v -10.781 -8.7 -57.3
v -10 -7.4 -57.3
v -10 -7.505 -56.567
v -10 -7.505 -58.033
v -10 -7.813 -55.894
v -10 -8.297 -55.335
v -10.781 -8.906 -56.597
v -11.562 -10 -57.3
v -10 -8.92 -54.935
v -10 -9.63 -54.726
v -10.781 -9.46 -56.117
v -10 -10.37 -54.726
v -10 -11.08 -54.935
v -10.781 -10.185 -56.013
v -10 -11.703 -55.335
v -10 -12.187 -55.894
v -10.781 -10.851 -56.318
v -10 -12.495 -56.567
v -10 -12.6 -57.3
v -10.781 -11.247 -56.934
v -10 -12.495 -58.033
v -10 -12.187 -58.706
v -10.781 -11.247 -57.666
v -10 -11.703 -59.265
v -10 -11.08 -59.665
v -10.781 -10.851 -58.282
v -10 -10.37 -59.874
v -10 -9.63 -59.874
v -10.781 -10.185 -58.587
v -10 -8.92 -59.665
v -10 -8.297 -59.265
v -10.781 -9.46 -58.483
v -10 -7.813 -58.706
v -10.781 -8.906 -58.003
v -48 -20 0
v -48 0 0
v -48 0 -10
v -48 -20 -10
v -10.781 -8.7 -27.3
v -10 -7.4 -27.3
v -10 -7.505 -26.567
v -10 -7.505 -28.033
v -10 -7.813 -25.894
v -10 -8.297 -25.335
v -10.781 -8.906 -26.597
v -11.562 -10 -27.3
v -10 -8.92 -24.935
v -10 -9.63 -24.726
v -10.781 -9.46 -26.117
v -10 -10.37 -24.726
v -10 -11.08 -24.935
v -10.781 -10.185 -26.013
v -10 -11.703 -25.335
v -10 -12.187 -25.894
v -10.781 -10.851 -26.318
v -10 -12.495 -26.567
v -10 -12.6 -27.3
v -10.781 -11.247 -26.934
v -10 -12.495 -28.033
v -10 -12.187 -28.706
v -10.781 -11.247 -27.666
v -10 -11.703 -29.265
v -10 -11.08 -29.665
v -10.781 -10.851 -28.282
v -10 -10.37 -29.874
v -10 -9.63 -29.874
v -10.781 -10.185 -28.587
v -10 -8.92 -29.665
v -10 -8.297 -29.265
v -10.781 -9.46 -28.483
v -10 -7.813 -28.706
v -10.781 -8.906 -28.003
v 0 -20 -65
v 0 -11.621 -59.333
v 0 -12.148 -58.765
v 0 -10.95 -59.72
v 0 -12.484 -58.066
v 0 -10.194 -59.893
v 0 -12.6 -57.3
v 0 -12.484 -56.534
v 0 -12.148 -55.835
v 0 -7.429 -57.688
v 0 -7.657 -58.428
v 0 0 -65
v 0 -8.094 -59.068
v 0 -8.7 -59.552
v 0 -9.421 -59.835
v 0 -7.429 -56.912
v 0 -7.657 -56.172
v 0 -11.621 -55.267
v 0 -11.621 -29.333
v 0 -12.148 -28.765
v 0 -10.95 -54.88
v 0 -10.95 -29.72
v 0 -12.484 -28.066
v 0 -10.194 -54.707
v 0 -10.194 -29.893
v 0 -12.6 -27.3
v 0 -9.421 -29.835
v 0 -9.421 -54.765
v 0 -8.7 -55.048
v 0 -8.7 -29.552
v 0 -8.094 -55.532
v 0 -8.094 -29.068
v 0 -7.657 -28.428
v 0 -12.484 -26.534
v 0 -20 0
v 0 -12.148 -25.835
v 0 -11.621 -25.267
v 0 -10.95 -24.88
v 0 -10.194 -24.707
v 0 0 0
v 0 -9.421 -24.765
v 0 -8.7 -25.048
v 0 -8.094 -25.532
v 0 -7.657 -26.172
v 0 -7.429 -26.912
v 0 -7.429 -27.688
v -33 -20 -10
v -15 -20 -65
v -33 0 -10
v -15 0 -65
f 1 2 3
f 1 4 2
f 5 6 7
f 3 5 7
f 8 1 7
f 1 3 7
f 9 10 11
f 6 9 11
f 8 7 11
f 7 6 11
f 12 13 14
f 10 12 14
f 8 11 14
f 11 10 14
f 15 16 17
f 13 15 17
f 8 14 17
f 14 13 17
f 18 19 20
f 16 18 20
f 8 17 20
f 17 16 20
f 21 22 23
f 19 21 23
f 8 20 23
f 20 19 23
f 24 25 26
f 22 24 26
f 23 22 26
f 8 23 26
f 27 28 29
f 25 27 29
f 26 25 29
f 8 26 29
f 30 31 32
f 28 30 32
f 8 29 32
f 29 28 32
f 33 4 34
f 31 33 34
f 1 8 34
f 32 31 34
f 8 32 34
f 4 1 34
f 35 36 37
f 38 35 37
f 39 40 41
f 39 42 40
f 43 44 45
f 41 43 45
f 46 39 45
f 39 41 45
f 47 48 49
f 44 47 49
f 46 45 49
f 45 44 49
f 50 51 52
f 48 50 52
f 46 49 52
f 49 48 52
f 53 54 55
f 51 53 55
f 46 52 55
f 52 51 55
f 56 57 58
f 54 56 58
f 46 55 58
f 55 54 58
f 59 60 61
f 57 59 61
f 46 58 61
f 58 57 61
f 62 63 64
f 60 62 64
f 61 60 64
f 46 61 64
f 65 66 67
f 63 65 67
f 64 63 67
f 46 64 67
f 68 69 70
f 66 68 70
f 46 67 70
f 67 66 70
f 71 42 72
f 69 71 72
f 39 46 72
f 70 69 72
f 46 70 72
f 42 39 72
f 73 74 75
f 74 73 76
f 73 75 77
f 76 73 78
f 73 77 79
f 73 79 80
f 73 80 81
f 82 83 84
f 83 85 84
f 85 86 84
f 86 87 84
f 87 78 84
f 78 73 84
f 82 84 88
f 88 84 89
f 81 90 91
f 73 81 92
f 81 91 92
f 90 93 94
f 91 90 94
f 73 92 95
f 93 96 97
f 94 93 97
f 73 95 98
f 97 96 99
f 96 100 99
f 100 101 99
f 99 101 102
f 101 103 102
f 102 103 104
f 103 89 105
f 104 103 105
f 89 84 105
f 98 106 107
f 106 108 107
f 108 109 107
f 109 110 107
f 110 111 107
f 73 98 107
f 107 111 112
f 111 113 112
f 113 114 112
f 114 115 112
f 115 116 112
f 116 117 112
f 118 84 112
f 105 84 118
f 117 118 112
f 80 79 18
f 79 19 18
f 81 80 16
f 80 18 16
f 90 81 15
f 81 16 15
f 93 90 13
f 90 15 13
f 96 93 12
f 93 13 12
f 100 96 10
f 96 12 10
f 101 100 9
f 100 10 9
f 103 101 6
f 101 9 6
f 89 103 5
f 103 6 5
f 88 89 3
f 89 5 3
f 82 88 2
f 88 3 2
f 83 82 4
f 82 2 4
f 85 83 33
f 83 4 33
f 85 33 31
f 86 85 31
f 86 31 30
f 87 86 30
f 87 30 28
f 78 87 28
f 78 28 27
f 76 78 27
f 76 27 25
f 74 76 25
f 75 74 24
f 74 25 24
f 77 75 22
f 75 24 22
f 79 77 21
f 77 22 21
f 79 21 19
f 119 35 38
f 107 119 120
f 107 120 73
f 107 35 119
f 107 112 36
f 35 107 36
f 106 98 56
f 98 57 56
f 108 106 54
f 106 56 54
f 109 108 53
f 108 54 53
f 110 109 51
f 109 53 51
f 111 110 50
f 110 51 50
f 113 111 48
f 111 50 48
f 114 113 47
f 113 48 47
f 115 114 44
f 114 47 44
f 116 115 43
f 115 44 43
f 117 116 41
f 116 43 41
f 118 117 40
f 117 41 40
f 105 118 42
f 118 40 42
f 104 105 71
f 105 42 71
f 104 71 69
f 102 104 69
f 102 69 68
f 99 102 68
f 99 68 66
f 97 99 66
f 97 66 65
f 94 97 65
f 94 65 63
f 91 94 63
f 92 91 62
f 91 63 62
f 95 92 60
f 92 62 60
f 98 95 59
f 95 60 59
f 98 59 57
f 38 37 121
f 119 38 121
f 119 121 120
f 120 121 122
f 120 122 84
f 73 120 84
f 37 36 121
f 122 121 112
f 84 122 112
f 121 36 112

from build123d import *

# Parameters (mm, degrees)
F1_DEPTH = 20
F3_D     = 5.2
F3_DEPTH = 10
F3_TIP   = 1.5622376095


with BuildPart() as f1:
    # F0 (on Front) → F1 (new body)
    with BuildSketch(Plane.XZ):
        Polygon((0, -65), (0, 0), (-48, 0), (-48, -10), (-33, -10), (-15, -65), align=None)
    extrude(amount=F1_DEPTH)

    # F3
    with Locations(Plane.YZ):
        with Locations((-10, -27.3), (-10, -57.3)):
            Hole(F3_D / 2, depth=F3_DEPTH)
            with Locations((0, 0, -(F3_DEPTH + F3_TIP / 2))):  # 118° drill point
                Cone(0, F3_D / 2, F3_TIP, mode=Mode.SUBTRACT)


solid = f1.part
